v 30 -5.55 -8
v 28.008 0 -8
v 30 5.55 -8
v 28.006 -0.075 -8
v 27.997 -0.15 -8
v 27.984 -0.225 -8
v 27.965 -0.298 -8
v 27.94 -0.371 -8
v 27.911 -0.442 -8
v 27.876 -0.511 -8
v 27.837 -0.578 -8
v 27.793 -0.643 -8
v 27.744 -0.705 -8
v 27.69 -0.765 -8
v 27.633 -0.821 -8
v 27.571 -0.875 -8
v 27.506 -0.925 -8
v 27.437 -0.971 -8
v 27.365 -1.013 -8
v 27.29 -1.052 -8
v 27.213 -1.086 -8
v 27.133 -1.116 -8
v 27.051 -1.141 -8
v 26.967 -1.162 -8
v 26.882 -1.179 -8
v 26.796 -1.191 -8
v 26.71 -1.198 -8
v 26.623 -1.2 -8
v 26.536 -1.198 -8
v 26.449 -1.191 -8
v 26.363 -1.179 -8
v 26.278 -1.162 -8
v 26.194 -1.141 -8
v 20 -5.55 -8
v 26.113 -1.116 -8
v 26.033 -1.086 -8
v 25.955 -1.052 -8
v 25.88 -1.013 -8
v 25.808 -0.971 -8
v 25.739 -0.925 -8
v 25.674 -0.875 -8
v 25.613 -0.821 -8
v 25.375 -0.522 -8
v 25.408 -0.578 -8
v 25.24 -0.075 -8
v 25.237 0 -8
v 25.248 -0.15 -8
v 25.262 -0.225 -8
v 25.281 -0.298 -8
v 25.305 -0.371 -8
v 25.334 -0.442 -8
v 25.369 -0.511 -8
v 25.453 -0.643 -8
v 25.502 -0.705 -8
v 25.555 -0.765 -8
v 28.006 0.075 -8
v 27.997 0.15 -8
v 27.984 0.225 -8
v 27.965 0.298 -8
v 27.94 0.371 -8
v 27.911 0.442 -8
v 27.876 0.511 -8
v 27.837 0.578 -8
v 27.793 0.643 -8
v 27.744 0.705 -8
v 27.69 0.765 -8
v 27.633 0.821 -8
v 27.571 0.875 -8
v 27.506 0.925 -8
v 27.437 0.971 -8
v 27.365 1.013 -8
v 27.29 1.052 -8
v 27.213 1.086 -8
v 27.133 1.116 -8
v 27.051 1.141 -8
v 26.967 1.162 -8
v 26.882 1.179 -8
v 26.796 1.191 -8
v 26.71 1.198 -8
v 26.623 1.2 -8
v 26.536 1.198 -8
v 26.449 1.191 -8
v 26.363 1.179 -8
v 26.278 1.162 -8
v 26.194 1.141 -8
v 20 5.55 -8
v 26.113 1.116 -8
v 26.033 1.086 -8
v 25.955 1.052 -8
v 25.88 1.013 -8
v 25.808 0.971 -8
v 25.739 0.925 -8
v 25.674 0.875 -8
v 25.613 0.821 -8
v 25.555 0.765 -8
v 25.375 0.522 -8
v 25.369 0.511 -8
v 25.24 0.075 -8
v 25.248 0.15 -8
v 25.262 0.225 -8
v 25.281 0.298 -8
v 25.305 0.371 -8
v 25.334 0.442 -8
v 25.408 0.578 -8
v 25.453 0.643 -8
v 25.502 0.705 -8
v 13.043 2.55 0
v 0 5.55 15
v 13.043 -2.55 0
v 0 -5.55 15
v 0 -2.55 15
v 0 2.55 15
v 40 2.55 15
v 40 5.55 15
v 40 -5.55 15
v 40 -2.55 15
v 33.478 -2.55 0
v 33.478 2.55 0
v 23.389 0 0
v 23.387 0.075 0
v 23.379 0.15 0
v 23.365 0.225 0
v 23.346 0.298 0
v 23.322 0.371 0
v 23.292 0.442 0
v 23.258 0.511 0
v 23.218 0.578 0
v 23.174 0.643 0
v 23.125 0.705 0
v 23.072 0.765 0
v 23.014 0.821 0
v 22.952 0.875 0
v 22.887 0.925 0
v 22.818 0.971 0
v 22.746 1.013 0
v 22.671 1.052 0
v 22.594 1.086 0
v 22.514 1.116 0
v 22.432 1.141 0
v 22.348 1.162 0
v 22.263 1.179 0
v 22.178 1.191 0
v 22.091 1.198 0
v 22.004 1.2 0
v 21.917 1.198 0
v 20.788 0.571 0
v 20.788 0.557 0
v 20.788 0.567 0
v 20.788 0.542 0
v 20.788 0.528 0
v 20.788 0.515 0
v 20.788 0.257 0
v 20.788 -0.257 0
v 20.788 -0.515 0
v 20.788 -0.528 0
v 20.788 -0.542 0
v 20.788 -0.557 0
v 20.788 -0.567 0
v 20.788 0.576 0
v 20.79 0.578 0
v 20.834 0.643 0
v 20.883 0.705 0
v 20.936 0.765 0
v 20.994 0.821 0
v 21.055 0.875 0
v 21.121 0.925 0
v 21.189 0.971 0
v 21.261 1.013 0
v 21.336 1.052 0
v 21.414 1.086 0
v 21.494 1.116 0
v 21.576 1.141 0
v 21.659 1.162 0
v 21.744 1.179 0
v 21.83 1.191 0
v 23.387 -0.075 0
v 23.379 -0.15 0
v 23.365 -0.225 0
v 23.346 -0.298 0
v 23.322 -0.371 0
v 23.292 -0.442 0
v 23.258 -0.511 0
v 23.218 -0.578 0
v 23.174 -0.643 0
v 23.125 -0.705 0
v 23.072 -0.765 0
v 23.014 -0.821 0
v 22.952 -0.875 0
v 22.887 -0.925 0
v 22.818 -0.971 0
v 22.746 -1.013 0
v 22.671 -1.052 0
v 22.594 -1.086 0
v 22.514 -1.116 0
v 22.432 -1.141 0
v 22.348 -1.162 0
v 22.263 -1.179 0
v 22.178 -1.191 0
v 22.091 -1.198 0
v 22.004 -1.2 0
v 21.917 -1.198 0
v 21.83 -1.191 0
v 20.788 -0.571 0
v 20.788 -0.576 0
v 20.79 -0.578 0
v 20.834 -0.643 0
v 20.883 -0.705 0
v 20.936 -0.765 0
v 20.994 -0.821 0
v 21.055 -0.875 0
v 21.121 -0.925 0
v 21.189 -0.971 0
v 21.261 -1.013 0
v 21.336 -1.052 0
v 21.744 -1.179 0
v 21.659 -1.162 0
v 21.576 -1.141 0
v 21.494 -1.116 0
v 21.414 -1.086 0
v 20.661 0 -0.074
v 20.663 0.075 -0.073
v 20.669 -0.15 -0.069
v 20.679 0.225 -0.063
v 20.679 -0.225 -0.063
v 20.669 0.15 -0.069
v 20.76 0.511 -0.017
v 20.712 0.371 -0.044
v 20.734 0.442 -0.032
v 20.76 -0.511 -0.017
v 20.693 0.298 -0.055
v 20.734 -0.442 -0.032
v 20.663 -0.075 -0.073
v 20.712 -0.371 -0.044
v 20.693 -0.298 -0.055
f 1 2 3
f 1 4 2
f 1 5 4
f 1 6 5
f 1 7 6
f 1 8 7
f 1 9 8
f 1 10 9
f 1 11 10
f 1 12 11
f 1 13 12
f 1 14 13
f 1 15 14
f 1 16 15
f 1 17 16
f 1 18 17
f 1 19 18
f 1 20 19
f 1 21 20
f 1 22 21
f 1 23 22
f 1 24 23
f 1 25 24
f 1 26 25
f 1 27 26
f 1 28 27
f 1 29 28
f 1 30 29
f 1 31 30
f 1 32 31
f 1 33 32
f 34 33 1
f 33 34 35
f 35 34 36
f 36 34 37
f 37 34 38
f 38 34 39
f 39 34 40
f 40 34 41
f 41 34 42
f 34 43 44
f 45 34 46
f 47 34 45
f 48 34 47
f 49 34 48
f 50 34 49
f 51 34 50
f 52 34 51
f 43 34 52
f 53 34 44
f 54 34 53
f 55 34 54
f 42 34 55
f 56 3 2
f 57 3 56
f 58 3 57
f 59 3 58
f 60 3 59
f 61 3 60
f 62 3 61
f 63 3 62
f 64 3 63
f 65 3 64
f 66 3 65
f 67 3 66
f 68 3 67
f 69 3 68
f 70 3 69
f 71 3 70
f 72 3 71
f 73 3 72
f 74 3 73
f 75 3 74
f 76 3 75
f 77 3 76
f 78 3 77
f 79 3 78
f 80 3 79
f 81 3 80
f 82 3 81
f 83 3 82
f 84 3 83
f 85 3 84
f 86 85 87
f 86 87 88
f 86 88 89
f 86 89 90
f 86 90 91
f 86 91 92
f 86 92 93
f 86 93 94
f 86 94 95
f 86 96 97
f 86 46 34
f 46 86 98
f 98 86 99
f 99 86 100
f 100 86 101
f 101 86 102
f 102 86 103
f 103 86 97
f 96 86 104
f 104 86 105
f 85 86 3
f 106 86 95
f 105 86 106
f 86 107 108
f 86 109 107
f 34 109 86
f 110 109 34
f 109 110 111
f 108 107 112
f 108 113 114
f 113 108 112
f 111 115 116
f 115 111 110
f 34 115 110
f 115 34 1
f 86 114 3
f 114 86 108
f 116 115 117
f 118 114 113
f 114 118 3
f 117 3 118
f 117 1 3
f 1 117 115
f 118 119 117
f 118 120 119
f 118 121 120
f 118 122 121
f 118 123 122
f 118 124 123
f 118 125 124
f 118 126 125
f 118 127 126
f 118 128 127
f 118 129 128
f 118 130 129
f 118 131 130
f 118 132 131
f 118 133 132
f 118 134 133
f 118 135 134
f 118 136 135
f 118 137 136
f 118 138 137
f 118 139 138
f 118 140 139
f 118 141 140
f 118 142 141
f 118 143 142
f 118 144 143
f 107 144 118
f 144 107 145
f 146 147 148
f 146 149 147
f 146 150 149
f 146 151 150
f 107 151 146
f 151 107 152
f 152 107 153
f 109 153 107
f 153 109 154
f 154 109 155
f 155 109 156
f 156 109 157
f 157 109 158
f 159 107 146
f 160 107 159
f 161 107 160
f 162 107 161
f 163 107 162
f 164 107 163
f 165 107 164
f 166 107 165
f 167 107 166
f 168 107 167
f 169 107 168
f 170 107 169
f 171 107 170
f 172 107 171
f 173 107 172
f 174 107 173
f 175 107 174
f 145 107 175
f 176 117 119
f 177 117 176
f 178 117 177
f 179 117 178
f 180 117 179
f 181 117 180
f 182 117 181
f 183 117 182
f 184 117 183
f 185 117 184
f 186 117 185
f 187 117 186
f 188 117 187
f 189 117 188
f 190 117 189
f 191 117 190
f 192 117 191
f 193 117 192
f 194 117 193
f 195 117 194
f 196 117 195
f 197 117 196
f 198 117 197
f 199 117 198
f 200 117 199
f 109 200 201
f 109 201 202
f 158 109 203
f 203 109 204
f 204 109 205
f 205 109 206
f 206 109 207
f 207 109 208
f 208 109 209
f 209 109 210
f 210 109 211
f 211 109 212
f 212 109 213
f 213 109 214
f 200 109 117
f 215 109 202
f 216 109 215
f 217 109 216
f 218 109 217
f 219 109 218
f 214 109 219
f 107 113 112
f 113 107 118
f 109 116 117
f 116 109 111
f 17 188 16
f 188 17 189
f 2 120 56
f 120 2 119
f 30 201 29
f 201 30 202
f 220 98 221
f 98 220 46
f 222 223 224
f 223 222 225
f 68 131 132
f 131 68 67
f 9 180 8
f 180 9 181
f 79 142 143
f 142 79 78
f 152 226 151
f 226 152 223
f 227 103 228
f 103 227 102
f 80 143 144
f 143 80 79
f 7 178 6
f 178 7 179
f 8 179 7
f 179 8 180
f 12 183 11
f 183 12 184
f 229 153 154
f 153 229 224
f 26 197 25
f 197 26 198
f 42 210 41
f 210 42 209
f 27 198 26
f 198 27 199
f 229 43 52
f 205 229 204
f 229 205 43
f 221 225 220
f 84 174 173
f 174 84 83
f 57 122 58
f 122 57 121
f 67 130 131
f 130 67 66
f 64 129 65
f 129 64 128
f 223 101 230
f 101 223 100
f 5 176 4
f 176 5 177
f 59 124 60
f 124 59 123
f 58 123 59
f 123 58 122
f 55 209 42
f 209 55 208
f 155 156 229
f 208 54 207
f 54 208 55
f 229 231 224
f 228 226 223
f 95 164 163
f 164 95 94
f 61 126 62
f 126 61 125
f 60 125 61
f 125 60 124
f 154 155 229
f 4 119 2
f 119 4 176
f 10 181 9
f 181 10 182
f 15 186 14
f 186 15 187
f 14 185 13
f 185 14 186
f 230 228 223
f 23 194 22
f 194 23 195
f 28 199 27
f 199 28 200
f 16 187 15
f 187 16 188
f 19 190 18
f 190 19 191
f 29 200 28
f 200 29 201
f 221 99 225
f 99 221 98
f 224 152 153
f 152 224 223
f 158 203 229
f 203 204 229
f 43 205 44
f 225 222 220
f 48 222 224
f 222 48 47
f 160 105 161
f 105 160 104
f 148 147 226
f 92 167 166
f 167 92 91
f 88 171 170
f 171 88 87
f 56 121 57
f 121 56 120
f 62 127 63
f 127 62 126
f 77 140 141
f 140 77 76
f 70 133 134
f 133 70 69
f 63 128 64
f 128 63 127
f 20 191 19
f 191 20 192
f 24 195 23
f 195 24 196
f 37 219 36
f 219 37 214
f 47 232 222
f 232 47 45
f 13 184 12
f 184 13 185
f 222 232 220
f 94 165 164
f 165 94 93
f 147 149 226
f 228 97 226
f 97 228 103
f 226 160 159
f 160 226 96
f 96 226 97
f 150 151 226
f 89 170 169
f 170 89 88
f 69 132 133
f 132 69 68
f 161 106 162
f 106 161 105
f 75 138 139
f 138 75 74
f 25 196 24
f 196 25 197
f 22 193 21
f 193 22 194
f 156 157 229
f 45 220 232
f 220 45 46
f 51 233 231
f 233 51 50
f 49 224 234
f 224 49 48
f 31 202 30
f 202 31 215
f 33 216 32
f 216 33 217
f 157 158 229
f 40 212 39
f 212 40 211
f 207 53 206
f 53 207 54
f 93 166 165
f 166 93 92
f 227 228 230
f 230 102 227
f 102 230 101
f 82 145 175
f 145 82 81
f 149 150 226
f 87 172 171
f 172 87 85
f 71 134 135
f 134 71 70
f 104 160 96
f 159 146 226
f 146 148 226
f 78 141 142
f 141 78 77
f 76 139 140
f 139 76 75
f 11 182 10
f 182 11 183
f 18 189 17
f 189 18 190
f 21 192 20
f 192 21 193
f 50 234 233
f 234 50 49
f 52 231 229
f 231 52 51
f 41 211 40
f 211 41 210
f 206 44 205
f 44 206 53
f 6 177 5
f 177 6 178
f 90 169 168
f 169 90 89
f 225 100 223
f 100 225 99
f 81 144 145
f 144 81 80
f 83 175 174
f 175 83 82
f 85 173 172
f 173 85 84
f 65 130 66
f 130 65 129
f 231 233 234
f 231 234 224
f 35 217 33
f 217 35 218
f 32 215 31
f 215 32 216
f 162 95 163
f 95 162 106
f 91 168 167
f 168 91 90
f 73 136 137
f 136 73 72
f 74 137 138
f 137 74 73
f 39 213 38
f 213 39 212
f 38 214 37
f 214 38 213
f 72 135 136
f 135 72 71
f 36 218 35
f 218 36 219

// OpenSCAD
$fs = 0.01;
$fn = 100;

thick = 3;
board_thick = 5.1;
a = 15;
b = 8;
c = 40;

wire_diam = 2.4;

difference()
{
    union()
    {
        translate([0,0,-b])
        rotate(90, [1,0,0])
        translate([0,0,-thick-board_thick/2])
        linear_extrude(2*thick+board_thick)
        {
            polygon([[0,a+b], [c,a+b], [0.75*c,0], [c/2,0]]);
        }
    }

    translate([0,-board_thick/2,0])
    cube([c,board_thick,a+$fs]);

    color("green")
    translate([0.68*c,0,-b-1])
    rotate(-30,[0,1,0])
    cylinder(b+3, wire_diam/2,wire_diam/2);
}
